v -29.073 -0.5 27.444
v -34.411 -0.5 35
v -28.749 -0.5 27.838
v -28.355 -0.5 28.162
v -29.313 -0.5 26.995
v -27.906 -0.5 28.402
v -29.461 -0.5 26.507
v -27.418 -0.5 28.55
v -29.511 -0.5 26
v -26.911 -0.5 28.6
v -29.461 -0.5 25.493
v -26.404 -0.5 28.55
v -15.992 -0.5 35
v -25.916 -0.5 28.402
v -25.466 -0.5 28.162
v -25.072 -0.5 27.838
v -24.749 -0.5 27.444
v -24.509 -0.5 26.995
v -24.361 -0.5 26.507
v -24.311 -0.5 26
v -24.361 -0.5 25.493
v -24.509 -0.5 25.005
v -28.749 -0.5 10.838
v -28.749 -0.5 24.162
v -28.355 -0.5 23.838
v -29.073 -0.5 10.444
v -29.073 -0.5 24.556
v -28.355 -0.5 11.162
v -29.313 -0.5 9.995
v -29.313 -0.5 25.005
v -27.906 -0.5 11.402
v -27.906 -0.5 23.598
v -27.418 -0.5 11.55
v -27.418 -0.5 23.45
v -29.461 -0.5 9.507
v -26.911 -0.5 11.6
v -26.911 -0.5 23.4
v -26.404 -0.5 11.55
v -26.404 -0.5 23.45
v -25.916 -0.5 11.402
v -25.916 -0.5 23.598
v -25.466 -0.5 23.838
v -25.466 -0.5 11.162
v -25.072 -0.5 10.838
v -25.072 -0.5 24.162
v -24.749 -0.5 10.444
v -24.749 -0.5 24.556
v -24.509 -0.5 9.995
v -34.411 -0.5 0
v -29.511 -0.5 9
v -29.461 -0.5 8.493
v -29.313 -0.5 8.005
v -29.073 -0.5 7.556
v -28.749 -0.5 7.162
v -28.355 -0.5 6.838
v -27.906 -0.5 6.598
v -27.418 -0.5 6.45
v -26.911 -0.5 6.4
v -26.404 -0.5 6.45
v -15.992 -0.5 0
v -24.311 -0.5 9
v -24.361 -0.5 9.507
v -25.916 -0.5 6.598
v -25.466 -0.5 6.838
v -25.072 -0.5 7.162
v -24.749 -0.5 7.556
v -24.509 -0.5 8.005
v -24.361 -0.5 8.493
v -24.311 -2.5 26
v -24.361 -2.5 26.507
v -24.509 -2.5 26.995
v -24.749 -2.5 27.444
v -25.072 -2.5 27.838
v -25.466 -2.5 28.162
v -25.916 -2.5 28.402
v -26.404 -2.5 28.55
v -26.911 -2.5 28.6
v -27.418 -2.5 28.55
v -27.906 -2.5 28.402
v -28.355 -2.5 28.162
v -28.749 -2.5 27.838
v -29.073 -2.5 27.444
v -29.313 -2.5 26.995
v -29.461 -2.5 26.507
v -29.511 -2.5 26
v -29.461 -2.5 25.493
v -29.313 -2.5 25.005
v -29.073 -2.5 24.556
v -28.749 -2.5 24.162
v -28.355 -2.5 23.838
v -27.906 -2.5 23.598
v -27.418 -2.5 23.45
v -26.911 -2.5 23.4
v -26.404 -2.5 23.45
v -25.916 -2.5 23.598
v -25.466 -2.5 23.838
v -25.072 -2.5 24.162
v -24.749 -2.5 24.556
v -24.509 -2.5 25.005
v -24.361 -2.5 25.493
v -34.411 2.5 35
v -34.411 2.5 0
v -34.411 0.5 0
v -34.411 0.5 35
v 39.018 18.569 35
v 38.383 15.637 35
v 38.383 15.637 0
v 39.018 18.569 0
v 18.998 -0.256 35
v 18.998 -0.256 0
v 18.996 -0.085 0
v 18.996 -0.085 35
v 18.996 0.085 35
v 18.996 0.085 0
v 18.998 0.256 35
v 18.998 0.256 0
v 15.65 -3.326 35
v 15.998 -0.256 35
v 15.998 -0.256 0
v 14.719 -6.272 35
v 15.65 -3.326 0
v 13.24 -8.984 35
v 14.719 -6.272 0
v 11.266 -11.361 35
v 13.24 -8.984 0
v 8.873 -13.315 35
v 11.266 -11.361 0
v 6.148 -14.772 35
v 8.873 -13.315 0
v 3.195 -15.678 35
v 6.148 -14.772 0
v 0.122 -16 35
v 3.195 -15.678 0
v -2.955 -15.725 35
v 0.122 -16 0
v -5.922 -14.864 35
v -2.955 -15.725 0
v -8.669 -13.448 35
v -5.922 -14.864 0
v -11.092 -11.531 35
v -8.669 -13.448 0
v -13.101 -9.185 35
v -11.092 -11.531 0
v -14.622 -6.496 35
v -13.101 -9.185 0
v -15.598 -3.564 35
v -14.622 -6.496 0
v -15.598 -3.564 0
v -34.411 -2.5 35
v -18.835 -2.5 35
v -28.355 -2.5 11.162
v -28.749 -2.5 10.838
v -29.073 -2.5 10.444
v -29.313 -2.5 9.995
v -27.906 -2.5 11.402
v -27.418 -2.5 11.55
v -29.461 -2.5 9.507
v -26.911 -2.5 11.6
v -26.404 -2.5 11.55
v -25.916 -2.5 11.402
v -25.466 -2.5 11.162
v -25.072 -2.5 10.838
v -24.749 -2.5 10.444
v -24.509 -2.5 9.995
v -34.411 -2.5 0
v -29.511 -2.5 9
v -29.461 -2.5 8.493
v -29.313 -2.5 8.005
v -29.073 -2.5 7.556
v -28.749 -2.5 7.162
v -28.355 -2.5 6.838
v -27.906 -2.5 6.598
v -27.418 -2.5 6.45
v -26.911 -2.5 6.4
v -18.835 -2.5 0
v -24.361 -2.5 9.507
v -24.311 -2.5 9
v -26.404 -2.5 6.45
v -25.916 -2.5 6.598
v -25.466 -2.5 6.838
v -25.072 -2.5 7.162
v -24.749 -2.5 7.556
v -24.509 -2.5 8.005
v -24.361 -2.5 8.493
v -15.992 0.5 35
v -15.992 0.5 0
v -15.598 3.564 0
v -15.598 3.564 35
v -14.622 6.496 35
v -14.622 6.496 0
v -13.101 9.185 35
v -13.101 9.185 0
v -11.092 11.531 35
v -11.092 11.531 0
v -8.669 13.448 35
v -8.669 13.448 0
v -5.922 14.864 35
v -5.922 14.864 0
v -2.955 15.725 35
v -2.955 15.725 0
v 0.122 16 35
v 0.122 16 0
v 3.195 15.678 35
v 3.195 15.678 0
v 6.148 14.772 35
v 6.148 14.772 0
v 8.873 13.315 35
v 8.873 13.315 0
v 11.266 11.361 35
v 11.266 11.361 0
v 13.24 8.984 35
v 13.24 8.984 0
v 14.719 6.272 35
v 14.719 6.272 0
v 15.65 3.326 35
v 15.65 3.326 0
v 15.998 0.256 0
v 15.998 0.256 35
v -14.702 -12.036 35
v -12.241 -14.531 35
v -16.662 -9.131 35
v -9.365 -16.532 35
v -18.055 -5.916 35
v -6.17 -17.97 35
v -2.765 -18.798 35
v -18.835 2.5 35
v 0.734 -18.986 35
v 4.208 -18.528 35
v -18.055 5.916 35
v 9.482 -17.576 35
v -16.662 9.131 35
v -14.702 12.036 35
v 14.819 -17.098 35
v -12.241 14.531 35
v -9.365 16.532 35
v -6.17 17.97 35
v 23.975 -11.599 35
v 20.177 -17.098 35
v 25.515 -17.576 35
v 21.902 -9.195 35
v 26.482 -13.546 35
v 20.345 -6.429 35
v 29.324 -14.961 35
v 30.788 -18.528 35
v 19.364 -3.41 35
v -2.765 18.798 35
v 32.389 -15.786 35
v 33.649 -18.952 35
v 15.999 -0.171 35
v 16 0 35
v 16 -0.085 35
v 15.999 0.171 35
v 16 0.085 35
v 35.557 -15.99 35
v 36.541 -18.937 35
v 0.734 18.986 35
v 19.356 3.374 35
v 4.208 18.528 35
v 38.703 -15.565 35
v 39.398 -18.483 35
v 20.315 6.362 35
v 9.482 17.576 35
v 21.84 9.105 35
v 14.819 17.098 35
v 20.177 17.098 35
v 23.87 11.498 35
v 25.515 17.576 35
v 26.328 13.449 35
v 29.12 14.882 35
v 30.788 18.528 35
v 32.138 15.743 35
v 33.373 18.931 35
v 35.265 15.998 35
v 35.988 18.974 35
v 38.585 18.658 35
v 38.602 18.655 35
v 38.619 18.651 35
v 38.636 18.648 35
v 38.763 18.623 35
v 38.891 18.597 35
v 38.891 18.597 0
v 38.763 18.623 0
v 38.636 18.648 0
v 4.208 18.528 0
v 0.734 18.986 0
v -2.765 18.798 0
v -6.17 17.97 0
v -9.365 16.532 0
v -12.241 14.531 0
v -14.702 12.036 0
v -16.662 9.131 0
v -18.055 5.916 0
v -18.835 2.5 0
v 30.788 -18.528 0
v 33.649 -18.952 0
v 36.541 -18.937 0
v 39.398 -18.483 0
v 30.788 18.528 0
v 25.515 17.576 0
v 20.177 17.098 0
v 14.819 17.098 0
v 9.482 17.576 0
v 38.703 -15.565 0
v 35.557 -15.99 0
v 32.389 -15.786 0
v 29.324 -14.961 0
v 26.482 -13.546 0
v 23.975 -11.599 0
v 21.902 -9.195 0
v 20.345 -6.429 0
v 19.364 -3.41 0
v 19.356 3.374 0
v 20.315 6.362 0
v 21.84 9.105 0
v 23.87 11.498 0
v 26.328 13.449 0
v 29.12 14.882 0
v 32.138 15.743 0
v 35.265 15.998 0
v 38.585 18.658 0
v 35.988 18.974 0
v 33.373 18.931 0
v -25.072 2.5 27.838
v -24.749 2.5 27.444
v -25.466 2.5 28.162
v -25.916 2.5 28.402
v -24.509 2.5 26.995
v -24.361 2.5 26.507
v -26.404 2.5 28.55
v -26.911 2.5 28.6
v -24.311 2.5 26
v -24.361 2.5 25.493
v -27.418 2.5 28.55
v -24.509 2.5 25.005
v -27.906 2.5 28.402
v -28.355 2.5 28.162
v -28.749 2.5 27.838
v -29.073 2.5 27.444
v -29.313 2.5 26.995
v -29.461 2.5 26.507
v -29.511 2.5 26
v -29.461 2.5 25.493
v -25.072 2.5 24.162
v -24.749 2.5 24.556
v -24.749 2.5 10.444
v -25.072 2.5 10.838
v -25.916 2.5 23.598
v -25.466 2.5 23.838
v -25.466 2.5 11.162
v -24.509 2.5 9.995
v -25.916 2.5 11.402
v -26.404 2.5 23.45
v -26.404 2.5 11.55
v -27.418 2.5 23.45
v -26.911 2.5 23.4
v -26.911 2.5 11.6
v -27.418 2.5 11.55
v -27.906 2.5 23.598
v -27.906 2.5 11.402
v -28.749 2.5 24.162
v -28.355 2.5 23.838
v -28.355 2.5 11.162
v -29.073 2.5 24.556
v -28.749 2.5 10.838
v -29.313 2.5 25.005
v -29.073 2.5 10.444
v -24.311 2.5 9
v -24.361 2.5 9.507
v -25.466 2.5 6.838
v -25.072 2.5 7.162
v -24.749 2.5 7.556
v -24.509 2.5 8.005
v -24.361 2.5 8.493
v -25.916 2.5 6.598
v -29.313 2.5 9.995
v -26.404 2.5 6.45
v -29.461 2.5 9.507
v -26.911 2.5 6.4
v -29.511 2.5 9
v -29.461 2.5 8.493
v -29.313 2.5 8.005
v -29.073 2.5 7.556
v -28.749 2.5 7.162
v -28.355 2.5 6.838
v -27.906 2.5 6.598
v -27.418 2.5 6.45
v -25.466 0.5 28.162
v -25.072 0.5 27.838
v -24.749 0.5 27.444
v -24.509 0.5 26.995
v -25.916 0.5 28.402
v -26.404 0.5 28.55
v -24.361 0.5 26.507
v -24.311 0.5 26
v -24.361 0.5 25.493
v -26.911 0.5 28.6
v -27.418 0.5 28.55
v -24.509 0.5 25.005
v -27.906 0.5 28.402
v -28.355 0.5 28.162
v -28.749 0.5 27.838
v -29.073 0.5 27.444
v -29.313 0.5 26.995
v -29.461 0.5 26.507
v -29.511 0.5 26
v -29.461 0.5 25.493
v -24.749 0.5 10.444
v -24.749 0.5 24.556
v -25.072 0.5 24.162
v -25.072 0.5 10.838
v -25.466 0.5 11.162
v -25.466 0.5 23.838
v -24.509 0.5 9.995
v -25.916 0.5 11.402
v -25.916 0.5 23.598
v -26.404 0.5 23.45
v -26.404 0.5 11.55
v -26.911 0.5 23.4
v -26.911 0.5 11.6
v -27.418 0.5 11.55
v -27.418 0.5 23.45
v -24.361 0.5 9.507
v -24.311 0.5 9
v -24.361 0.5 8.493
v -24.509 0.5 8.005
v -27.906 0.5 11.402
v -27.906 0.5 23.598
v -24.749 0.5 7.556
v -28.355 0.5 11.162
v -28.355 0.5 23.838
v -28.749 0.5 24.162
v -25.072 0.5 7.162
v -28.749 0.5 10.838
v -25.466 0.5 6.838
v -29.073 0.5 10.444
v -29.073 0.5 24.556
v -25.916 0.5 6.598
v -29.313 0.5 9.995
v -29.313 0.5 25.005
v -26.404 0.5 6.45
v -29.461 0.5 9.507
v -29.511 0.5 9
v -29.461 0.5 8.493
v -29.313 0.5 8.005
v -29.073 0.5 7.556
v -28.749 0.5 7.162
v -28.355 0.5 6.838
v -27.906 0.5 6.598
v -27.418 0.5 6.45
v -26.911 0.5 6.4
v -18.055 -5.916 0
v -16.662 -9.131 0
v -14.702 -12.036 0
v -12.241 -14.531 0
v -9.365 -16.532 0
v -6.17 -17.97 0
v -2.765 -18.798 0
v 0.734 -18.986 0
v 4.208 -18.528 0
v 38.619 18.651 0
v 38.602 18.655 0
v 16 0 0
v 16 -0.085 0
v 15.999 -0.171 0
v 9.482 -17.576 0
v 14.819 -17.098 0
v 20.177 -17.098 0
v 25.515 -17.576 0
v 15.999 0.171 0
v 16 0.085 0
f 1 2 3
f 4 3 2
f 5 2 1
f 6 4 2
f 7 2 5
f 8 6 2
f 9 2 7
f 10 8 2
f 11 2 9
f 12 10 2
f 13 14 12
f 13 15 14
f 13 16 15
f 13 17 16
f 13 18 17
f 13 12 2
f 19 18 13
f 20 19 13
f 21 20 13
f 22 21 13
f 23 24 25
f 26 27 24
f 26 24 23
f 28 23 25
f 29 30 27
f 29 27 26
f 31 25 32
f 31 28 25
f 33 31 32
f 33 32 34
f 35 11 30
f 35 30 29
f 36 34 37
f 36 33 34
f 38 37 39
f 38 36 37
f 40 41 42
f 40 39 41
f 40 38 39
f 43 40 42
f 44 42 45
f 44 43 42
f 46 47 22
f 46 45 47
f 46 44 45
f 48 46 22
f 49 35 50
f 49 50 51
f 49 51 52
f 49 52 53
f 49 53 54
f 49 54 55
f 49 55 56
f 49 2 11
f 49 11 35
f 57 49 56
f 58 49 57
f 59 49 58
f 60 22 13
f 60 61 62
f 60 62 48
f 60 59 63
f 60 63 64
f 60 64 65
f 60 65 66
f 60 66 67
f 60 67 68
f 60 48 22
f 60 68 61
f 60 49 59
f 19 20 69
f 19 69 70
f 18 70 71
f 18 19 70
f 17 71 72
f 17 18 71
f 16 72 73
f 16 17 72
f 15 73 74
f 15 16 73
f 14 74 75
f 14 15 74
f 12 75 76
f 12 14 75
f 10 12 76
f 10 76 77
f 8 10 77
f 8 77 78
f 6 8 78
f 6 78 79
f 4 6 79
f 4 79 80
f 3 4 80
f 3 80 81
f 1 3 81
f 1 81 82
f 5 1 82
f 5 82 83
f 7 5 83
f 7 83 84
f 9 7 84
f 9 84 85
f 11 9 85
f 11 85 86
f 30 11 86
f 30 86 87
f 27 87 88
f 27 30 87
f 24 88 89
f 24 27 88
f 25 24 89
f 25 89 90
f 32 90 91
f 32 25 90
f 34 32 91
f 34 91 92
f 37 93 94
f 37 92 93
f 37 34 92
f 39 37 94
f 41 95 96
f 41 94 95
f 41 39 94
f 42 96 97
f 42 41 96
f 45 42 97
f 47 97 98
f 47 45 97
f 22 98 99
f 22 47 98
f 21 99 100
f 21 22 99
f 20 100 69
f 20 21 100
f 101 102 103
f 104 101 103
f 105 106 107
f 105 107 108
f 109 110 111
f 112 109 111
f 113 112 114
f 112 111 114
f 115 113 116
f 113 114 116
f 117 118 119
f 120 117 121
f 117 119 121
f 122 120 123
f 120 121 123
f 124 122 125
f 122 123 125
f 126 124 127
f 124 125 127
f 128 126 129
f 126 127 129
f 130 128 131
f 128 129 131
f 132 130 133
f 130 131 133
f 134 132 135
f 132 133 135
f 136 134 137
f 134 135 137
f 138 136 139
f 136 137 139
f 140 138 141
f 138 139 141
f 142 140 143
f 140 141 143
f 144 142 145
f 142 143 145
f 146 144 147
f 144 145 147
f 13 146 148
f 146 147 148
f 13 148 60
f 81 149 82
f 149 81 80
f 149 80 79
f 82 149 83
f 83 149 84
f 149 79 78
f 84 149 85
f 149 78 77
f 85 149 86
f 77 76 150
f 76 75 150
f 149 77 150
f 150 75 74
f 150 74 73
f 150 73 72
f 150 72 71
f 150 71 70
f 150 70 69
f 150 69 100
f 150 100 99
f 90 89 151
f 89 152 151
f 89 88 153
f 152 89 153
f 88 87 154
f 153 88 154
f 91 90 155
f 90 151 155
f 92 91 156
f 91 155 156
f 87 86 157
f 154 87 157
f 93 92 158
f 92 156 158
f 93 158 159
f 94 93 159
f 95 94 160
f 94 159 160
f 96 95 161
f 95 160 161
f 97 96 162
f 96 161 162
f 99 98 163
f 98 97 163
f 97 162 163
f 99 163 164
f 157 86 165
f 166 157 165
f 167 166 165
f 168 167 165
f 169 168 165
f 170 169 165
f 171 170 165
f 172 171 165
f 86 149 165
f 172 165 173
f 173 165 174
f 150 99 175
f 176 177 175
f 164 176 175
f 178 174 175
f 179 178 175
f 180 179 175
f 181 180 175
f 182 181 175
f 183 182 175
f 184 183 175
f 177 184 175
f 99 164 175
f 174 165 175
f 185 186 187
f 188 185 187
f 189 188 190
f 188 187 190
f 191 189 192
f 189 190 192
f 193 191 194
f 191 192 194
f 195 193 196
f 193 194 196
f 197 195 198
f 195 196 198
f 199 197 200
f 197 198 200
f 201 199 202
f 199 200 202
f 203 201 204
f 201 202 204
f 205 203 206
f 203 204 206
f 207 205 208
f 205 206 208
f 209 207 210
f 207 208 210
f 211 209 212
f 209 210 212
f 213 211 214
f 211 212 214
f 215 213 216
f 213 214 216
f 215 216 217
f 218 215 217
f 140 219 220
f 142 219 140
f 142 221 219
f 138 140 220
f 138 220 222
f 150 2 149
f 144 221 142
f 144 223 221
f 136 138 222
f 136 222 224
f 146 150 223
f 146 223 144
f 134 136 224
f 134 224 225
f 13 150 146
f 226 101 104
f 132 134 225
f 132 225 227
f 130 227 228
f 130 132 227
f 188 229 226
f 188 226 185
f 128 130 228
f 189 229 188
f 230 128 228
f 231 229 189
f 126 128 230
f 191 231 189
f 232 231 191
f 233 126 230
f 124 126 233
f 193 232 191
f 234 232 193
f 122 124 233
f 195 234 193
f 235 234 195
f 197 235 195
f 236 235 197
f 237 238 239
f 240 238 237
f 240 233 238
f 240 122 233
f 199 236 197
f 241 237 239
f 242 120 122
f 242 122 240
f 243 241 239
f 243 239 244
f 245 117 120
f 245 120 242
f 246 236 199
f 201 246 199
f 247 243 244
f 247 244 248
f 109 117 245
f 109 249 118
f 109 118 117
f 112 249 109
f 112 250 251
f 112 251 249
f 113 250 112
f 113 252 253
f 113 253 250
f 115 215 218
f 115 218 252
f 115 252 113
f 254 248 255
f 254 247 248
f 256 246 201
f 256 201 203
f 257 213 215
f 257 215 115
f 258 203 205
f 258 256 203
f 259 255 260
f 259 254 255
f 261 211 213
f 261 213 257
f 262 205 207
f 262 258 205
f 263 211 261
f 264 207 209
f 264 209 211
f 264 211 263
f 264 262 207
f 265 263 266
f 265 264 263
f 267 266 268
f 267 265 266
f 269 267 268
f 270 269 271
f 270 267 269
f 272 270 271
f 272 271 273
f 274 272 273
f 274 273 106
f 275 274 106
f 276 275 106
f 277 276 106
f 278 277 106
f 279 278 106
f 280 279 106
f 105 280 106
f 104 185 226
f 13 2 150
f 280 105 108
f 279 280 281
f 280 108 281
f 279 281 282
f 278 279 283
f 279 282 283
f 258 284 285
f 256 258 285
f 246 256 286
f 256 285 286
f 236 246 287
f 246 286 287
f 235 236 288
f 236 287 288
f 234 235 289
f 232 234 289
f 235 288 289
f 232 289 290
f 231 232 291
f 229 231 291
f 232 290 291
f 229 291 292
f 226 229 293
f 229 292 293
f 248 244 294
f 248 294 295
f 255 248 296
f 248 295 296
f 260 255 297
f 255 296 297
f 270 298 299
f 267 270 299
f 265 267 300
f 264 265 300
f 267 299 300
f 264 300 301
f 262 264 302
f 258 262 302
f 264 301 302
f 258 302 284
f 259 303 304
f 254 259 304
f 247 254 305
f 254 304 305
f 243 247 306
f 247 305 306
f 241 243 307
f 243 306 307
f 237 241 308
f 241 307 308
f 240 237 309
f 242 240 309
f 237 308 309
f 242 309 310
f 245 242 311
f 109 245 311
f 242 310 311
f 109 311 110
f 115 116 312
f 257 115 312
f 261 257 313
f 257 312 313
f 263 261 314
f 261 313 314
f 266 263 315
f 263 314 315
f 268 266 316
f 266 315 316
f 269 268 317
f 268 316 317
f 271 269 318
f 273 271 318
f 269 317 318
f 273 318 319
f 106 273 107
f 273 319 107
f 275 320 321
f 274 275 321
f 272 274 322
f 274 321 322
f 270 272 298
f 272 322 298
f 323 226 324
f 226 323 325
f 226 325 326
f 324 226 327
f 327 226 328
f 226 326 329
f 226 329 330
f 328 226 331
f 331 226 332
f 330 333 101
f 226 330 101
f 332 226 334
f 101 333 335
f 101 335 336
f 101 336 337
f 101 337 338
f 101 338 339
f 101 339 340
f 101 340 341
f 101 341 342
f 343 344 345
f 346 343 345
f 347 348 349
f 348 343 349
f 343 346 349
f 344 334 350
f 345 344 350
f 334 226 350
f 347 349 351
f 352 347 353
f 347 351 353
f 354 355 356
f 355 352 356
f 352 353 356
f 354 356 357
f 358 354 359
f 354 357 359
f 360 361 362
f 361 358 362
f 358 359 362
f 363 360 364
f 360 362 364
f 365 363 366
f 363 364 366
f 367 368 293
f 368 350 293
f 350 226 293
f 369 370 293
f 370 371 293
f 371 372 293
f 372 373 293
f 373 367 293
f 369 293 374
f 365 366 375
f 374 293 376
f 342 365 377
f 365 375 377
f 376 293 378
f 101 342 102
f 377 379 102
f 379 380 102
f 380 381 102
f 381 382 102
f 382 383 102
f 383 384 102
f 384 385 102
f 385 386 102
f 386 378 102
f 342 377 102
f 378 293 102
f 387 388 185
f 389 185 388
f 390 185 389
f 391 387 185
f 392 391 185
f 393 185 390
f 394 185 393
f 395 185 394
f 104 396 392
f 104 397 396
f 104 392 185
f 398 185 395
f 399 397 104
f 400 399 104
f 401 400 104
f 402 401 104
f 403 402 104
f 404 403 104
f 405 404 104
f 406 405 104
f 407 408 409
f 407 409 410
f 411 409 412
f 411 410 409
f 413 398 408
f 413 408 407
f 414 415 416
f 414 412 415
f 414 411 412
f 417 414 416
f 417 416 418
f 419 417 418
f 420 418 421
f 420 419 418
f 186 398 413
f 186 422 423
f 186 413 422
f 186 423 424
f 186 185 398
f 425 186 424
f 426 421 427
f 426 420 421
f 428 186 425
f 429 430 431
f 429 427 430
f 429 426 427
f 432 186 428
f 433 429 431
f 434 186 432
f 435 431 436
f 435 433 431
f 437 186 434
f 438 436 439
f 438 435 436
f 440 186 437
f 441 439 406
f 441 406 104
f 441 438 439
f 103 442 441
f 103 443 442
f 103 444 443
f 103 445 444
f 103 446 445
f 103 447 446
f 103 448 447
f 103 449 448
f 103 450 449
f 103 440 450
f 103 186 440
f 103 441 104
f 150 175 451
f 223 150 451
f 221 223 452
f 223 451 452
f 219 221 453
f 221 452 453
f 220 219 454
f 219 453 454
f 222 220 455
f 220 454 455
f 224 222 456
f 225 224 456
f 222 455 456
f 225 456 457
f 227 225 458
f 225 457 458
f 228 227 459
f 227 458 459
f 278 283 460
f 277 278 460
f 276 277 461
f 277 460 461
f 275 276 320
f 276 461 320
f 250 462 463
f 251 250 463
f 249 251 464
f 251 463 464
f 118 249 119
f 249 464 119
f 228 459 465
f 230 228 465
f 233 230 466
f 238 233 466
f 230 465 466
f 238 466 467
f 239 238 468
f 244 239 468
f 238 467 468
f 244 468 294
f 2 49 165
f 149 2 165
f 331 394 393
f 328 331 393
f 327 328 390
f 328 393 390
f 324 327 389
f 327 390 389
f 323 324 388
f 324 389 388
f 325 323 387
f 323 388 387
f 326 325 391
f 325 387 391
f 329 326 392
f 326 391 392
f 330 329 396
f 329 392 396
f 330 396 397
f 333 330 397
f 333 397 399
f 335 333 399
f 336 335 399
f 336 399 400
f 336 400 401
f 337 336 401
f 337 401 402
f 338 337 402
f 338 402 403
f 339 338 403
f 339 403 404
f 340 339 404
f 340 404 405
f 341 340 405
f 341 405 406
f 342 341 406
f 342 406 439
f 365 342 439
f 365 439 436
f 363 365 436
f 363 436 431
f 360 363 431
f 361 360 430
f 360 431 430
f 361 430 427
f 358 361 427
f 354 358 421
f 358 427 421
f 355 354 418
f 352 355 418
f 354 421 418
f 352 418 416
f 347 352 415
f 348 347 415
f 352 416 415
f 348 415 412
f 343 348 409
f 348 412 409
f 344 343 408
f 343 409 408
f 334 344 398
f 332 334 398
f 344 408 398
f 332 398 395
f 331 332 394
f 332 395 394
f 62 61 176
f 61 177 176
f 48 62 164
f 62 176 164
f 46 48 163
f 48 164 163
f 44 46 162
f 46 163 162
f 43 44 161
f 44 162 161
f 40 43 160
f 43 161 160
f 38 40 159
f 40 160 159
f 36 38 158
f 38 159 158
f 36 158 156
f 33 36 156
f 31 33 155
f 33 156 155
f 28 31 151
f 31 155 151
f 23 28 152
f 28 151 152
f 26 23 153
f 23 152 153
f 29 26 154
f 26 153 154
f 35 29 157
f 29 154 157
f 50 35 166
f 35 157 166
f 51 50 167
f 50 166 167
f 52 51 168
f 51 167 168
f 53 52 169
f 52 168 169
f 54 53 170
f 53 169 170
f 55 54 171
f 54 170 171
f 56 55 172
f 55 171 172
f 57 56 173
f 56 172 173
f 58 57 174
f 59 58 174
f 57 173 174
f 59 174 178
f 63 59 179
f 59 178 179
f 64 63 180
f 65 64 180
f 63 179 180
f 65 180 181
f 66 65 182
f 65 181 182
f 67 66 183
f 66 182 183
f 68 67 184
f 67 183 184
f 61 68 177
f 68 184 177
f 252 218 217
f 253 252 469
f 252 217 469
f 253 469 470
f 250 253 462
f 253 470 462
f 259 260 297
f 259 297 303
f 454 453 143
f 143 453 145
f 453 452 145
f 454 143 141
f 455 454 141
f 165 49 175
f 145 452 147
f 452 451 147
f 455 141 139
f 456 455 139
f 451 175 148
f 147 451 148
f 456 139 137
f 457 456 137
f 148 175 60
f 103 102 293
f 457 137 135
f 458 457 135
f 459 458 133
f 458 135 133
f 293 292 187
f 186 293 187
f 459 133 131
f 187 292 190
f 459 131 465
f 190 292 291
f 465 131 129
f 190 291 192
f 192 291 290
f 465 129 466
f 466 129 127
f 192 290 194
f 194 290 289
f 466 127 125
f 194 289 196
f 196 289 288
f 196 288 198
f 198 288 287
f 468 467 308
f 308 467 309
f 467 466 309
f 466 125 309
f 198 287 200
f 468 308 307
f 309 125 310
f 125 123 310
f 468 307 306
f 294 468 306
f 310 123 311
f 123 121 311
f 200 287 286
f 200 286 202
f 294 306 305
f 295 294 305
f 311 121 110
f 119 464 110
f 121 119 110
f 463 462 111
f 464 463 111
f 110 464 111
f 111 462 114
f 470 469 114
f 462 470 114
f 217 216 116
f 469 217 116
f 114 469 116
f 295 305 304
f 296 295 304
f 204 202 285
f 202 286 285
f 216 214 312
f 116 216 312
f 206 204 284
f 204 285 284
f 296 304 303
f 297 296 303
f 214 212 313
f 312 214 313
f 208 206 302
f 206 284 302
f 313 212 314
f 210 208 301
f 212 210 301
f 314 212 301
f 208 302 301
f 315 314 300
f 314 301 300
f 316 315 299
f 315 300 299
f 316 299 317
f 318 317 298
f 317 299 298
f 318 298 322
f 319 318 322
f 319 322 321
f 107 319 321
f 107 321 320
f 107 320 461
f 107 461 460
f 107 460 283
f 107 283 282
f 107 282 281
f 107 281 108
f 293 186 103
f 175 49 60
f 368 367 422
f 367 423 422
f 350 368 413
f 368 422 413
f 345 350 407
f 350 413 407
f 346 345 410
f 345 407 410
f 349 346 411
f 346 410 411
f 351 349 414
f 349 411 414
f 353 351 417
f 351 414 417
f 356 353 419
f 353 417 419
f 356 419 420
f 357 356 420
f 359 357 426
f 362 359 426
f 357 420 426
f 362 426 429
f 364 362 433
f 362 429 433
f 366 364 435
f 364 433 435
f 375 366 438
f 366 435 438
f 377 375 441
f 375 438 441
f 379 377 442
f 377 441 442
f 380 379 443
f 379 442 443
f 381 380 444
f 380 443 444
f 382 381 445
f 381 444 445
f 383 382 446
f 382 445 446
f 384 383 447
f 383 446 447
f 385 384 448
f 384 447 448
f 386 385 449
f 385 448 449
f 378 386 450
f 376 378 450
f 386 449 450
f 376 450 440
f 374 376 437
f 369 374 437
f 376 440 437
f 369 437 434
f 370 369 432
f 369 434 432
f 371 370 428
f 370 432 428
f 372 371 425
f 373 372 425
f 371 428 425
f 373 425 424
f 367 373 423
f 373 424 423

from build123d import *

# Parameters (mm, degrees)
F1_DEPTH = 35
F3_DEPTH = 40
F4_DEPTH = 35
F5_R     = 2.6
F6_DEPTH = 12.5


with BuildPart() as f1:
    # F0 (on Top) → F1 (new body)
    with BuildSketch(Plane.XY):
        with BuildLine():
            ThreePointArc((30.7878121478, 18.5280684134), (17.4981090624, 17.03775814), (4.208405977, 18.5280684134))
            ThreePointArc((4.208405977, 18.5280684134), (-19, 0), (4.208405977, -18.5280684134))
            ThreePointArc((4.208405977, -18.5280684134), (17.4981090624, -17.03775814), (30.7878121478, -18.5280684134))
            ThreePointArc((30.7878121478, -18.5280684134), (35.0954185177, -18.999741032), (39.3978648328, -18.4831140844))
            Line((39.3978648328, -18.4831140844), (38.7028679842, -15.5647276501))
            ThreePointArc((38.7028679842, -15.5647276501), (25.1801121151, -12.6350331541), (18.9982711603, -0.2563062995))
            ThreePointArc((18.9982711603, -0.2563062995), (18.9962181249, 0), (18.9982711603, 0.2563062995))
            ThreePointArc((18.9982711603, 0.2563062995), (25.0510572832, 12.5337055907), (38.3828757407, 15.6374726281))
            Line((38.3828757407, 15.6374726281), (39.0178740437, 18.5694987458))
            ThreePointArc((39.0178740437, 18.5694987458), (38.8268942308, 18.6098339748), (38.6355101254, 18.6482051076))
            ThreePointArc((38.6355101254, 18.6482051076), (38.6103354346, 18.6531004412), (38.585154159, 18.6579617896))
            ThreePointArc((38.585154159, 18.6579617896), (34.6797472339, 18.9973641902), (30.7878121478, 18.5280684134))
        make_face()
        with BuildLine():
            ThreePointArc((15.9979469646, 0.2563062995), (15.9994867329, 0.1281572609), (16, 0))
            ThreePointArc((16, 0), (15.9994867329, -0.1281572609), (15.9979469646, -0.2563062995))
            ThreePointArc((15.9979469646, -0.2563062995), (-16, 0), (15.9979469646, 0.2563062995))
        make_face(mode=Mode.SUBTRACT)
    extrude(amount=F1_DEPTH)

    # F2 (on Top) → F3 (cut)
    with BuildSketch(Plane.XY):
        Polygon((-18.4108596295, -0.5), (-14.4108596295, -0.5), (-14.4108596295, 0.5), (-18.4108596295, 0.5), (-22.4108596295, 0.5), (-22.4108596295, -0.5), align=None)
    extrude(amount=F3_DEPTH, mode=Mode.SUBTRACT)

    # F2 (on Top) → F4 (join)
    with BuildSketch(Plane.XY):
        Polygon((-22.4108596295, 0.5), (-18.4108596295, 0.5), (-18.4108596295, 2.5), (-34.4108596295, 2.5), (-34.4108596295, 0.5), align=None)
        Polygon((-18.4108596295, -2.5), (-18.4108596295, -0.5), (-22.4108596295, -0.5), (-34.4108596295, -0.5), (-34.4108596295, -2.5), align=None)
    extrude(amount=F4_DEPTH)

    # F5 (on Front) → F6 (cut, symmetric)
    with BuildSketch(Plane.XZ):
        with Locations((-26.9108596295, 26)):
            Circle(F5_R)
        with Locations((-26.9108596295, 9)):
            Circle(F5_R)
    extrude(amount=F6_DEPTH, both=True, mode=Mode.SUBTRACT)


solid = f1.part
